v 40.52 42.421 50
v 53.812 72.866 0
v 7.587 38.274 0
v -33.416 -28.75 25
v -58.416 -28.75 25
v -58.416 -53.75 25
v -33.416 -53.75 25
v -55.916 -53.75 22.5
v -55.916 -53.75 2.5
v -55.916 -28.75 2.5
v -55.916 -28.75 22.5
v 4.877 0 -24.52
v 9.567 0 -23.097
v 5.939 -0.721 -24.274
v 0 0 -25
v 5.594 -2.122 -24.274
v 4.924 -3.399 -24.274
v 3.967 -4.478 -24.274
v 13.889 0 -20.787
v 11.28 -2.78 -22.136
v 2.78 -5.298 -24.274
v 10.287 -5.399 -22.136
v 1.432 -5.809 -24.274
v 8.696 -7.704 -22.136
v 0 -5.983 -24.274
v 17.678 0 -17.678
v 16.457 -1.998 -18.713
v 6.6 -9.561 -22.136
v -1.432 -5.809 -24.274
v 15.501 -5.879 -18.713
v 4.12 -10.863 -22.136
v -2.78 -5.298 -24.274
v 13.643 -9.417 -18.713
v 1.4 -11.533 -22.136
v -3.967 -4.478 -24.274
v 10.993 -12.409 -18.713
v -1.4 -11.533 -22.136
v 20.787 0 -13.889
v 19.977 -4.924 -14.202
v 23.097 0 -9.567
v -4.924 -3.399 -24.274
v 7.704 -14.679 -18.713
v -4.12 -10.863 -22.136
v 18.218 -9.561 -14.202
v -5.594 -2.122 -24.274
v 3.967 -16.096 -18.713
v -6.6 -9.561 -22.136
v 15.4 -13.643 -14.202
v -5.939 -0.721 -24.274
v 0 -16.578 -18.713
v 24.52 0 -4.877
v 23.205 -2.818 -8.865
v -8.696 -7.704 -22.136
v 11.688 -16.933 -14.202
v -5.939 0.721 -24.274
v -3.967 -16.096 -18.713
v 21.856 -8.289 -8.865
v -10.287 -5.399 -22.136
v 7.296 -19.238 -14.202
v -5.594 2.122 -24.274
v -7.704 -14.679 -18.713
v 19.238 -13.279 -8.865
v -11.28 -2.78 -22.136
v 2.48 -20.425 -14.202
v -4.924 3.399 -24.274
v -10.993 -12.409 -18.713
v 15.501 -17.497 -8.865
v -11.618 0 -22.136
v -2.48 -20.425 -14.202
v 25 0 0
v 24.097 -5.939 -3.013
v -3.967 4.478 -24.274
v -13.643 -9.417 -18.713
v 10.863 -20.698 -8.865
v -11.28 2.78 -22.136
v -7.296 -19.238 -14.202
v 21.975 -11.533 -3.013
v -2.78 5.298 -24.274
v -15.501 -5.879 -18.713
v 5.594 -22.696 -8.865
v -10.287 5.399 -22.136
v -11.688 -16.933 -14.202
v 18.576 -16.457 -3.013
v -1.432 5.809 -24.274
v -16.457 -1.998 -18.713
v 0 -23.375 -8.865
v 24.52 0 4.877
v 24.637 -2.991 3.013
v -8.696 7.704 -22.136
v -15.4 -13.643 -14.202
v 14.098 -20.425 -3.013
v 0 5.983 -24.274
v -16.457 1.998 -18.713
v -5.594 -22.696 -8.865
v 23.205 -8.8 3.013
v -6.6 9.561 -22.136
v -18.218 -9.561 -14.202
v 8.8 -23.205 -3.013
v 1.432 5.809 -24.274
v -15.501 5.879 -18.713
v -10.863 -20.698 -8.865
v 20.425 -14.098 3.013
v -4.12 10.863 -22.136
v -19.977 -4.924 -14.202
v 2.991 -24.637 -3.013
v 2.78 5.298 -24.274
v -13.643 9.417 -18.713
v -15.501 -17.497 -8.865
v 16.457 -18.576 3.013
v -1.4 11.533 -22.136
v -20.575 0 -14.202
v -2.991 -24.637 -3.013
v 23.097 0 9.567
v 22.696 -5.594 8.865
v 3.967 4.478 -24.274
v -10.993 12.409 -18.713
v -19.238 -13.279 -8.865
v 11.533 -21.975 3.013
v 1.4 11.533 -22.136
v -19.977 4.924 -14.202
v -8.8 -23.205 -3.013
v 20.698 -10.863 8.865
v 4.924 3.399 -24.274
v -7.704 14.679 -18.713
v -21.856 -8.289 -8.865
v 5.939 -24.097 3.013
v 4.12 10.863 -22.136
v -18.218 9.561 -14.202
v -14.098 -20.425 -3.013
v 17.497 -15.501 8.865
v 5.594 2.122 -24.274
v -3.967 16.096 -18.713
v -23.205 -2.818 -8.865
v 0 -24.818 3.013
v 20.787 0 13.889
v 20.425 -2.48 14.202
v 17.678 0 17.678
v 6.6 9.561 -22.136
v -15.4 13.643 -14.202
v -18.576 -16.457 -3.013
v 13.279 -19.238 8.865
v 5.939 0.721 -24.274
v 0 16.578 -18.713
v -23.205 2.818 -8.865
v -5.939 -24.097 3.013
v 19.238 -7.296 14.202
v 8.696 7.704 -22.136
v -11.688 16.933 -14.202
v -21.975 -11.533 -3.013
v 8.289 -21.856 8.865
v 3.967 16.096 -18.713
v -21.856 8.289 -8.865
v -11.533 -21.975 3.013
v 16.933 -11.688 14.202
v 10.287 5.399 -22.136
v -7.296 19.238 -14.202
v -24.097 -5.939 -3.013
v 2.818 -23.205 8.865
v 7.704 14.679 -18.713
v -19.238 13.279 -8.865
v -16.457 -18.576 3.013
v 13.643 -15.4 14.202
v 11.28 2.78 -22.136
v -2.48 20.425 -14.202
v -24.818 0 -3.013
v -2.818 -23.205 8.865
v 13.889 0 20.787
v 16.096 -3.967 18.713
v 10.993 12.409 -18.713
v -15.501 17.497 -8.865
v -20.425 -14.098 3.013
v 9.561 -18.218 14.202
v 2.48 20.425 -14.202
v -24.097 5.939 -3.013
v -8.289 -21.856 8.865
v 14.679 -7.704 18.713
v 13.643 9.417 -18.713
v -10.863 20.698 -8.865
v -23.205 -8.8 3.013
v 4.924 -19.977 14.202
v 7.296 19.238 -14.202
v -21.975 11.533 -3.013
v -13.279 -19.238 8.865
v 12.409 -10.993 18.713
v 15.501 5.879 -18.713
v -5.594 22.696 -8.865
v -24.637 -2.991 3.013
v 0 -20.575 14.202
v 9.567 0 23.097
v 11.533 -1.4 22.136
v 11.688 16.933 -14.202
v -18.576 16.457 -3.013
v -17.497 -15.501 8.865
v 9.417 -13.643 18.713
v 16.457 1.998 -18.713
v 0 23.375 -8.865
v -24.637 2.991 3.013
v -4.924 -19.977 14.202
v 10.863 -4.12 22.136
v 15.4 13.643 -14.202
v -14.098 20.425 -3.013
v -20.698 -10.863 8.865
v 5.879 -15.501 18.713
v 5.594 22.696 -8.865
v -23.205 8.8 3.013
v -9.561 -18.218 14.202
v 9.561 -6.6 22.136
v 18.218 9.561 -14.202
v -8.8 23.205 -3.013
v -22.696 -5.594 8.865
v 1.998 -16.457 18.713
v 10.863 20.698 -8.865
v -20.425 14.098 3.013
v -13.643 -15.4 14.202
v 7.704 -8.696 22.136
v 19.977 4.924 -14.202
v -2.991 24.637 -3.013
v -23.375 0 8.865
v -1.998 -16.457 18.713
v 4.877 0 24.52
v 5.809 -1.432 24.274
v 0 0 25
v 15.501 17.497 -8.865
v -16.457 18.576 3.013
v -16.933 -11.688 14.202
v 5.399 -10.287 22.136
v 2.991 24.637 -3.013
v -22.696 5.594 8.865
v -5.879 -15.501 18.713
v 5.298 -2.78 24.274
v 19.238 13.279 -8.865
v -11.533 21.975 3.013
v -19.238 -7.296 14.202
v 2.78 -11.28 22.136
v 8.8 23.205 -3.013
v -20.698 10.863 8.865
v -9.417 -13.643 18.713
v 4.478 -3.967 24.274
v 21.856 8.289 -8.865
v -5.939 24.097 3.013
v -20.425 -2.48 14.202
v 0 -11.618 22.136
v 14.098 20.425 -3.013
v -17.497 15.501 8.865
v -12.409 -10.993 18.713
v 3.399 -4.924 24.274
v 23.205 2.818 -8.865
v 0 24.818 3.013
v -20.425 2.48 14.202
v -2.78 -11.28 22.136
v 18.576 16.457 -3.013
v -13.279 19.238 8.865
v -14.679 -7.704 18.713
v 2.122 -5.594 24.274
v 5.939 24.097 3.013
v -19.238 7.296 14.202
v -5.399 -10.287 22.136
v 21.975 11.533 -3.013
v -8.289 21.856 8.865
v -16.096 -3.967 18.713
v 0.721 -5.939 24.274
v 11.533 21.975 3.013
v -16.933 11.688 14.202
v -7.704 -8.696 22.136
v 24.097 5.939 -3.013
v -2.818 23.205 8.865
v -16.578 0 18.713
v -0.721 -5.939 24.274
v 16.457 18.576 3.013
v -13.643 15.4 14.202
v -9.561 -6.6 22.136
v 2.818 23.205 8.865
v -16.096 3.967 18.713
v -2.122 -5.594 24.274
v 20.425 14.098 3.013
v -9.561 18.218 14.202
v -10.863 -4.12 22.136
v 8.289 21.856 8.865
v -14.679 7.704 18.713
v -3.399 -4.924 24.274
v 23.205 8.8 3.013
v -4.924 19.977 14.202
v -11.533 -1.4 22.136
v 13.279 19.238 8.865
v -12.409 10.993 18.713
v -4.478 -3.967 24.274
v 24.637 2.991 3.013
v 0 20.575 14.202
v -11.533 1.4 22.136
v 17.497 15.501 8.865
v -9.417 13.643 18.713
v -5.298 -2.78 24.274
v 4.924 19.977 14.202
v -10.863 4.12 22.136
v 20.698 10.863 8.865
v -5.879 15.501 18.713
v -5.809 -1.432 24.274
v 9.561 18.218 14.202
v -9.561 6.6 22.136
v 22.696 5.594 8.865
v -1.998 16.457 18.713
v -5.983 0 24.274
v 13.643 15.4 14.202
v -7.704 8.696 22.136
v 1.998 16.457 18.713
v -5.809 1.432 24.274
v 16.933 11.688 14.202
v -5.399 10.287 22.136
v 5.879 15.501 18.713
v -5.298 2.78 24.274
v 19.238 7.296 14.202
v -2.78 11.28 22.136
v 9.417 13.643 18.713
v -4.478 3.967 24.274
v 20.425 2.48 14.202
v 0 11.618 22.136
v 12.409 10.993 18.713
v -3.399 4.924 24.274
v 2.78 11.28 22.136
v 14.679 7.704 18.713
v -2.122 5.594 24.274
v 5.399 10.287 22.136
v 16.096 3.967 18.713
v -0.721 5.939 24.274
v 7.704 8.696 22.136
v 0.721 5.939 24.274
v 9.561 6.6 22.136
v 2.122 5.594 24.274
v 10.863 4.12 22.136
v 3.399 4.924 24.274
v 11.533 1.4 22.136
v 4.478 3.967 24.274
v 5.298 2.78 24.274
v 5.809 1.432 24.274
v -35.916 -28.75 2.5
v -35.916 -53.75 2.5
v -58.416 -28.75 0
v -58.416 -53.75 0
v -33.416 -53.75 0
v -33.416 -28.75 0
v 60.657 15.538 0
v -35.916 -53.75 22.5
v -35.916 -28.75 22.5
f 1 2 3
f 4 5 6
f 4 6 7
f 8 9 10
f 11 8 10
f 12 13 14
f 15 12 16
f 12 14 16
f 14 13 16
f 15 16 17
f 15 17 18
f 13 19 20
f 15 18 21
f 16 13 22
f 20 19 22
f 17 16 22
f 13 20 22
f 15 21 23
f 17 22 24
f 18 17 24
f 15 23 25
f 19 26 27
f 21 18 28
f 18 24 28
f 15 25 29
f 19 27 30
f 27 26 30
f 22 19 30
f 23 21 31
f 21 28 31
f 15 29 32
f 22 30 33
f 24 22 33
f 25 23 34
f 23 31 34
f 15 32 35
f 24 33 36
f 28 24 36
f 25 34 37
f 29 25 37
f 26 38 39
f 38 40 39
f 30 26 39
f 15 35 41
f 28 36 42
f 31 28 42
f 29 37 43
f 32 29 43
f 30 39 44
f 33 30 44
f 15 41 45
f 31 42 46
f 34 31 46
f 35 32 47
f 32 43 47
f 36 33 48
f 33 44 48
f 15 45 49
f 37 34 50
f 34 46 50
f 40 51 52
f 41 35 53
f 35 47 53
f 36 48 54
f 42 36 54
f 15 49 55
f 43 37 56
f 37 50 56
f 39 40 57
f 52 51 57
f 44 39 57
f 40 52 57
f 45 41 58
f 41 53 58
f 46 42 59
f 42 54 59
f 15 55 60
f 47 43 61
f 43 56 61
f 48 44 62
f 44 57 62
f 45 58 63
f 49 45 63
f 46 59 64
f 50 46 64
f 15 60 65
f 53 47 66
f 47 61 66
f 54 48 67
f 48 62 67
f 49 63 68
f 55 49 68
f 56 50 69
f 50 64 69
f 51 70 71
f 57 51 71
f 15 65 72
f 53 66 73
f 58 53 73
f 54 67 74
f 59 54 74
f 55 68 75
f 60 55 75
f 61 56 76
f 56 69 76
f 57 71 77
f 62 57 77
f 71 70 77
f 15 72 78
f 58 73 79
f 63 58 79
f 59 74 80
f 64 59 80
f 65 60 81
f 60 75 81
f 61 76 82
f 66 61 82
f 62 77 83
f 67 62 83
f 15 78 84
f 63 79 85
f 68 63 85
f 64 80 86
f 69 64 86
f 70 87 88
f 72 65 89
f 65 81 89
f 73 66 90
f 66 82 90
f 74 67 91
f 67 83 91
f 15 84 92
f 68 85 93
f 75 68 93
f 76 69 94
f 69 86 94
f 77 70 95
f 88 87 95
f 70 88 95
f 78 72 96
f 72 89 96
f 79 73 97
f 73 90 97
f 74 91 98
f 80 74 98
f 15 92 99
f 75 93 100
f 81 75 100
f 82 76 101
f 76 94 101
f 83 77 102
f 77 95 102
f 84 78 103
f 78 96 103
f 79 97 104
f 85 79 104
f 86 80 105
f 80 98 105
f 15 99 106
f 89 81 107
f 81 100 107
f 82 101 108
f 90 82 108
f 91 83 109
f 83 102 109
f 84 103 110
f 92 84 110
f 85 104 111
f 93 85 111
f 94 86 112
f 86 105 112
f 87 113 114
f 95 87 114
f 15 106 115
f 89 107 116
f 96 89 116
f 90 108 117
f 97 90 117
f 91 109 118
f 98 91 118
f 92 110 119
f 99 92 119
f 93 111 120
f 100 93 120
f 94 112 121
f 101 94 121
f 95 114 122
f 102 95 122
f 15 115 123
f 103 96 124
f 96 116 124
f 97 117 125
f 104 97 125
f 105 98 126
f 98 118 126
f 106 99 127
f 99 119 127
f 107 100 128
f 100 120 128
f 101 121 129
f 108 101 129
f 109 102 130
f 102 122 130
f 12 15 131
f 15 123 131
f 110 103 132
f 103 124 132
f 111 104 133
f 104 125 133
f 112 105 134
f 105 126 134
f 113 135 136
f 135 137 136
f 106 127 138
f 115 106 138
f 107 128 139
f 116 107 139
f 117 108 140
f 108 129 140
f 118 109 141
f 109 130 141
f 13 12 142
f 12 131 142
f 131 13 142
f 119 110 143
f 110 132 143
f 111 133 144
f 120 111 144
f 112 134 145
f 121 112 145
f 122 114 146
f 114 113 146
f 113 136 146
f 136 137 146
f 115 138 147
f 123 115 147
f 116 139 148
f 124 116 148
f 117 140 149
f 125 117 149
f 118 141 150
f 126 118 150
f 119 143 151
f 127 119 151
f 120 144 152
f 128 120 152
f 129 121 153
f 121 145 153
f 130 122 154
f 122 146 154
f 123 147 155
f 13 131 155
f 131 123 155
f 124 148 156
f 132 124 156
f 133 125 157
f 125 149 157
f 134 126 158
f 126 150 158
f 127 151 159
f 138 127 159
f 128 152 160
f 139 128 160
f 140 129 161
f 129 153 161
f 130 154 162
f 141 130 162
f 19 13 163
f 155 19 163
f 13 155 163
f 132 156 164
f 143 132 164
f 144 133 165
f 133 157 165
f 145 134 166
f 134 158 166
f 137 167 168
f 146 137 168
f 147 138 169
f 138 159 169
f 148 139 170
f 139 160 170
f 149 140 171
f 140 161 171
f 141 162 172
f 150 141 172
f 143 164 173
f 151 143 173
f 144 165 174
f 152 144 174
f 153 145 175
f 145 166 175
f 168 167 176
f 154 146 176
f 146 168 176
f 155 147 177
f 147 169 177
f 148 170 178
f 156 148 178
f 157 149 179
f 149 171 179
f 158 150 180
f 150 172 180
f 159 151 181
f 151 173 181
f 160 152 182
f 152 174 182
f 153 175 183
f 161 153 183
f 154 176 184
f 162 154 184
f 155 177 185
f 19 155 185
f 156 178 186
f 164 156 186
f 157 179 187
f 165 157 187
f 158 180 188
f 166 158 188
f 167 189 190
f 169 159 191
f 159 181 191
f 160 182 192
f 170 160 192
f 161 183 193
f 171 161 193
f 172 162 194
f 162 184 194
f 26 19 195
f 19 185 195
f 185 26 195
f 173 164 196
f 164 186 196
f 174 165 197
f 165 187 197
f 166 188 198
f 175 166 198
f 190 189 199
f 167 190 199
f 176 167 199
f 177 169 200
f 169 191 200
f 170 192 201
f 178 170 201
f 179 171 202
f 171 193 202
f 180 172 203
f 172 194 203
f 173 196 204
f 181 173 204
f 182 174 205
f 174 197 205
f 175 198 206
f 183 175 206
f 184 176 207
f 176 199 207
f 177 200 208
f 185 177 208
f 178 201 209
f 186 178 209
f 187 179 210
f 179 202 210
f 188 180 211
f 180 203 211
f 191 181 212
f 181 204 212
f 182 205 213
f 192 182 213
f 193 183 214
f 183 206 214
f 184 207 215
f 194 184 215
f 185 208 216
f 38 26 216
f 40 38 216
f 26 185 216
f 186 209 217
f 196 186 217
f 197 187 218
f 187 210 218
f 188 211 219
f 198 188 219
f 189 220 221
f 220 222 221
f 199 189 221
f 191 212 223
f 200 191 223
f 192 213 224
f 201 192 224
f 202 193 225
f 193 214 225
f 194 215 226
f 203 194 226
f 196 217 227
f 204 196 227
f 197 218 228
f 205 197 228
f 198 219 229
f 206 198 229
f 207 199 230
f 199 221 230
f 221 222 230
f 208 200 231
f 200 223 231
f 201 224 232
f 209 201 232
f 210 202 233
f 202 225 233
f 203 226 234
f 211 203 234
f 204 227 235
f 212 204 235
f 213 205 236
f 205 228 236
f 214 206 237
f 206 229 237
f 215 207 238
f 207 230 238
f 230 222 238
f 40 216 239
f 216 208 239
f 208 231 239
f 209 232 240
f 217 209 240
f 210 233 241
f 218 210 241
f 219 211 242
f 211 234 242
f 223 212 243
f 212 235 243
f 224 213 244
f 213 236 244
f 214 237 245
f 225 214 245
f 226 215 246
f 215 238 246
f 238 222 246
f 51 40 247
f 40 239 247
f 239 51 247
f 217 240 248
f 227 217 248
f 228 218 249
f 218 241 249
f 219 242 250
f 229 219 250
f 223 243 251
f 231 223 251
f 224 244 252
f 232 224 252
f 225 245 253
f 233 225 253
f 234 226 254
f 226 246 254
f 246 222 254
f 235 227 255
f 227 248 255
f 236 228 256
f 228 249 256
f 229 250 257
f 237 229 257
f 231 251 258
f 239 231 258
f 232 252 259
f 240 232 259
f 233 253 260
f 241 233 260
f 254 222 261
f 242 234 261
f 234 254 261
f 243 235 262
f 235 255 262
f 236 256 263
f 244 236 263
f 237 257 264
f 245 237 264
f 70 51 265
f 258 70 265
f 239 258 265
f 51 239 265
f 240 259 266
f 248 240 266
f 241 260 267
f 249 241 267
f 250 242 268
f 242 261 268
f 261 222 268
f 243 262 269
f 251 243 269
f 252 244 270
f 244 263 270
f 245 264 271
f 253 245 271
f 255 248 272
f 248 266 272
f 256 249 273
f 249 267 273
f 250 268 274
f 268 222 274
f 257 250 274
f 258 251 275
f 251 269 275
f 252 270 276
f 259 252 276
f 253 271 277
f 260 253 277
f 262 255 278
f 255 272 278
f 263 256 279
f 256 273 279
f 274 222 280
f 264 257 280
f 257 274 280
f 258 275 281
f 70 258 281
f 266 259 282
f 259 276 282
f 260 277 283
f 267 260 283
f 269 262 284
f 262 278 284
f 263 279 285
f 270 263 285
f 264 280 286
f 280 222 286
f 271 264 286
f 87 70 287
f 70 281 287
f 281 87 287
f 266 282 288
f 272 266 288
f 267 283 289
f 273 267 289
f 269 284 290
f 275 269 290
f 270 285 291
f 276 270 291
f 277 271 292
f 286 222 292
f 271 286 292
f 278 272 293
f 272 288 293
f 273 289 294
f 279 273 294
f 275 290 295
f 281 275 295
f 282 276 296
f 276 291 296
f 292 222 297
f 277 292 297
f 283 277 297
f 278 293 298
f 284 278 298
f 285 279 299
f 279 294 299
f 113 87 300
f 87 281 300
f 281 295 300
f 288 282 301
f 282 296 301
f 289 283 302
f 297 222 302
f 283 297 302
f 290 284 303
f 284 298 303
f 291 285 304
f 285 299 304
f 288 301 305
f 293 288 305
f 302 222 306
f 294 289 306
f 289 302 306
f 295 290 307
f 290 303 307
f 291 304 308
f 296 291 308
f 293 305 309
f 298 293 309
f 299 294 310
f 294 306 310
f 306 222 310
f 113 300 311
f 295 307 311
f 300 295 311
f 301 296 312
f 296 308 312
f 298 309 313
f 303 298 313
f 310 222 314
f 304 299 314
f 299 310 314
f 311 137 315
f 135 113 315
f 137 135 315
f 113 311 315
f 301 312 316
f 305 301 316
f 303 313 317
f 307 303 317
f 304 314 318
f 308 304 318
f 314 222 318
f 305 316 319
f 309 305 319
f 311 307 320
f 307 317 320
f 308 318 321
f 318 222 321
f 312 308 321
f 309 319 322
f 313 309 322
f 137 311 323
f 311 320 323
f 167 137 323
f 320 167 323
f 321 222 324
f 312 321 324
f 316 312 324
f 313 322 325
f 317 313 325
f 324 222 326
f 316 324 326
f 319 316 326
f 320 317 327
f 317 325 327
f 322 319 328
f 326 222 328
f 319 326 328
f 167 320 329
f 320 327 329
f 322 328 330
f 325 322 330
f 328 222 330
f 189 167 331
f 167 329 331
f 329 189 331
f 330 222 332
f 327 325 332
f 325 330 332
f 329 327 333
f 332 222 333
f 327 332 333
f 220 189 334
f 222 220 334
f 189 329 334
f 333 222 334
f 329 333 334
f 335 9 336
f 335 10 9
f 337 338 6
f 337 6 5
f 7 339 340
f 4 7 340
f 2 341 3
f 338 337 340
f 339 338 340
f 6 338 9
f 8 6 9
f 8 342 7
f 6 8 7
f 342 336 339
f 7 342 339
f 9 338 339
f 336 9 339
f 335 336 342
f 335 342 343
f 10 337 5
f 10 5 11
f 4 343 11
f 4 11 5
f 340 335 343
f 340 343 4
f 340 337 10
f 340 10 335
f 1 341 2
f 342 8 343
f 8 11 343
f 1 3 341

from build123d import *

# Parameters (mm, degrees)
F6_W     = 25
F6_H     = 25
F7_DEPTH = 25
F8_T     = -2.5


with BuildPart() as f1:
    # F0 (on Front) → F1 (revolve)
    with BuildSketch(Plane.XZ):
        with BuildLine():
            Line((0, 25), (0, -25))
            ThreePointArc((0, -25), (25, 0), (0, 25))
        make_face()
    revolve(axis=Axis((0, 0, 0), (0, 0, -1)))


with BuildPart() as f5:
    # F2 (on Top) → F5 section 0
    with BuildSketch(Plane.XY, mode=Mode.PRIVATE) as f5_s0:
        Polygon((60.6568771656, 15.5379695697), (53.8117700855, 72.8657799447), (7.5869834974, 38.2738381342), align=None)
    loft([f5_s0.sketch, Vertex(40.5203066766, 42.4208827317, 50)])


with BuildPart() as f7:
    # F6 (on Top) → F7 (new body)
    with BuildSketch(Plane.XY):
        with Locations((-45.9155738354, -41.2495669603)):
            Rectangle(F6_W, F6_H)
    extrude(amount=F7_DEPTH)

    # F8
    f8_openings = [f7.faces().sort_by_distance(p)[0] for p in [
        (-45.915574, -53.749567, 12.5),
        (-45.915574, -28.749567, 12.5),
    ]]
    offset(amount=F8_T, openings=f8_openings)


solid = Compound([f1.part, f5.part, f7.part])
